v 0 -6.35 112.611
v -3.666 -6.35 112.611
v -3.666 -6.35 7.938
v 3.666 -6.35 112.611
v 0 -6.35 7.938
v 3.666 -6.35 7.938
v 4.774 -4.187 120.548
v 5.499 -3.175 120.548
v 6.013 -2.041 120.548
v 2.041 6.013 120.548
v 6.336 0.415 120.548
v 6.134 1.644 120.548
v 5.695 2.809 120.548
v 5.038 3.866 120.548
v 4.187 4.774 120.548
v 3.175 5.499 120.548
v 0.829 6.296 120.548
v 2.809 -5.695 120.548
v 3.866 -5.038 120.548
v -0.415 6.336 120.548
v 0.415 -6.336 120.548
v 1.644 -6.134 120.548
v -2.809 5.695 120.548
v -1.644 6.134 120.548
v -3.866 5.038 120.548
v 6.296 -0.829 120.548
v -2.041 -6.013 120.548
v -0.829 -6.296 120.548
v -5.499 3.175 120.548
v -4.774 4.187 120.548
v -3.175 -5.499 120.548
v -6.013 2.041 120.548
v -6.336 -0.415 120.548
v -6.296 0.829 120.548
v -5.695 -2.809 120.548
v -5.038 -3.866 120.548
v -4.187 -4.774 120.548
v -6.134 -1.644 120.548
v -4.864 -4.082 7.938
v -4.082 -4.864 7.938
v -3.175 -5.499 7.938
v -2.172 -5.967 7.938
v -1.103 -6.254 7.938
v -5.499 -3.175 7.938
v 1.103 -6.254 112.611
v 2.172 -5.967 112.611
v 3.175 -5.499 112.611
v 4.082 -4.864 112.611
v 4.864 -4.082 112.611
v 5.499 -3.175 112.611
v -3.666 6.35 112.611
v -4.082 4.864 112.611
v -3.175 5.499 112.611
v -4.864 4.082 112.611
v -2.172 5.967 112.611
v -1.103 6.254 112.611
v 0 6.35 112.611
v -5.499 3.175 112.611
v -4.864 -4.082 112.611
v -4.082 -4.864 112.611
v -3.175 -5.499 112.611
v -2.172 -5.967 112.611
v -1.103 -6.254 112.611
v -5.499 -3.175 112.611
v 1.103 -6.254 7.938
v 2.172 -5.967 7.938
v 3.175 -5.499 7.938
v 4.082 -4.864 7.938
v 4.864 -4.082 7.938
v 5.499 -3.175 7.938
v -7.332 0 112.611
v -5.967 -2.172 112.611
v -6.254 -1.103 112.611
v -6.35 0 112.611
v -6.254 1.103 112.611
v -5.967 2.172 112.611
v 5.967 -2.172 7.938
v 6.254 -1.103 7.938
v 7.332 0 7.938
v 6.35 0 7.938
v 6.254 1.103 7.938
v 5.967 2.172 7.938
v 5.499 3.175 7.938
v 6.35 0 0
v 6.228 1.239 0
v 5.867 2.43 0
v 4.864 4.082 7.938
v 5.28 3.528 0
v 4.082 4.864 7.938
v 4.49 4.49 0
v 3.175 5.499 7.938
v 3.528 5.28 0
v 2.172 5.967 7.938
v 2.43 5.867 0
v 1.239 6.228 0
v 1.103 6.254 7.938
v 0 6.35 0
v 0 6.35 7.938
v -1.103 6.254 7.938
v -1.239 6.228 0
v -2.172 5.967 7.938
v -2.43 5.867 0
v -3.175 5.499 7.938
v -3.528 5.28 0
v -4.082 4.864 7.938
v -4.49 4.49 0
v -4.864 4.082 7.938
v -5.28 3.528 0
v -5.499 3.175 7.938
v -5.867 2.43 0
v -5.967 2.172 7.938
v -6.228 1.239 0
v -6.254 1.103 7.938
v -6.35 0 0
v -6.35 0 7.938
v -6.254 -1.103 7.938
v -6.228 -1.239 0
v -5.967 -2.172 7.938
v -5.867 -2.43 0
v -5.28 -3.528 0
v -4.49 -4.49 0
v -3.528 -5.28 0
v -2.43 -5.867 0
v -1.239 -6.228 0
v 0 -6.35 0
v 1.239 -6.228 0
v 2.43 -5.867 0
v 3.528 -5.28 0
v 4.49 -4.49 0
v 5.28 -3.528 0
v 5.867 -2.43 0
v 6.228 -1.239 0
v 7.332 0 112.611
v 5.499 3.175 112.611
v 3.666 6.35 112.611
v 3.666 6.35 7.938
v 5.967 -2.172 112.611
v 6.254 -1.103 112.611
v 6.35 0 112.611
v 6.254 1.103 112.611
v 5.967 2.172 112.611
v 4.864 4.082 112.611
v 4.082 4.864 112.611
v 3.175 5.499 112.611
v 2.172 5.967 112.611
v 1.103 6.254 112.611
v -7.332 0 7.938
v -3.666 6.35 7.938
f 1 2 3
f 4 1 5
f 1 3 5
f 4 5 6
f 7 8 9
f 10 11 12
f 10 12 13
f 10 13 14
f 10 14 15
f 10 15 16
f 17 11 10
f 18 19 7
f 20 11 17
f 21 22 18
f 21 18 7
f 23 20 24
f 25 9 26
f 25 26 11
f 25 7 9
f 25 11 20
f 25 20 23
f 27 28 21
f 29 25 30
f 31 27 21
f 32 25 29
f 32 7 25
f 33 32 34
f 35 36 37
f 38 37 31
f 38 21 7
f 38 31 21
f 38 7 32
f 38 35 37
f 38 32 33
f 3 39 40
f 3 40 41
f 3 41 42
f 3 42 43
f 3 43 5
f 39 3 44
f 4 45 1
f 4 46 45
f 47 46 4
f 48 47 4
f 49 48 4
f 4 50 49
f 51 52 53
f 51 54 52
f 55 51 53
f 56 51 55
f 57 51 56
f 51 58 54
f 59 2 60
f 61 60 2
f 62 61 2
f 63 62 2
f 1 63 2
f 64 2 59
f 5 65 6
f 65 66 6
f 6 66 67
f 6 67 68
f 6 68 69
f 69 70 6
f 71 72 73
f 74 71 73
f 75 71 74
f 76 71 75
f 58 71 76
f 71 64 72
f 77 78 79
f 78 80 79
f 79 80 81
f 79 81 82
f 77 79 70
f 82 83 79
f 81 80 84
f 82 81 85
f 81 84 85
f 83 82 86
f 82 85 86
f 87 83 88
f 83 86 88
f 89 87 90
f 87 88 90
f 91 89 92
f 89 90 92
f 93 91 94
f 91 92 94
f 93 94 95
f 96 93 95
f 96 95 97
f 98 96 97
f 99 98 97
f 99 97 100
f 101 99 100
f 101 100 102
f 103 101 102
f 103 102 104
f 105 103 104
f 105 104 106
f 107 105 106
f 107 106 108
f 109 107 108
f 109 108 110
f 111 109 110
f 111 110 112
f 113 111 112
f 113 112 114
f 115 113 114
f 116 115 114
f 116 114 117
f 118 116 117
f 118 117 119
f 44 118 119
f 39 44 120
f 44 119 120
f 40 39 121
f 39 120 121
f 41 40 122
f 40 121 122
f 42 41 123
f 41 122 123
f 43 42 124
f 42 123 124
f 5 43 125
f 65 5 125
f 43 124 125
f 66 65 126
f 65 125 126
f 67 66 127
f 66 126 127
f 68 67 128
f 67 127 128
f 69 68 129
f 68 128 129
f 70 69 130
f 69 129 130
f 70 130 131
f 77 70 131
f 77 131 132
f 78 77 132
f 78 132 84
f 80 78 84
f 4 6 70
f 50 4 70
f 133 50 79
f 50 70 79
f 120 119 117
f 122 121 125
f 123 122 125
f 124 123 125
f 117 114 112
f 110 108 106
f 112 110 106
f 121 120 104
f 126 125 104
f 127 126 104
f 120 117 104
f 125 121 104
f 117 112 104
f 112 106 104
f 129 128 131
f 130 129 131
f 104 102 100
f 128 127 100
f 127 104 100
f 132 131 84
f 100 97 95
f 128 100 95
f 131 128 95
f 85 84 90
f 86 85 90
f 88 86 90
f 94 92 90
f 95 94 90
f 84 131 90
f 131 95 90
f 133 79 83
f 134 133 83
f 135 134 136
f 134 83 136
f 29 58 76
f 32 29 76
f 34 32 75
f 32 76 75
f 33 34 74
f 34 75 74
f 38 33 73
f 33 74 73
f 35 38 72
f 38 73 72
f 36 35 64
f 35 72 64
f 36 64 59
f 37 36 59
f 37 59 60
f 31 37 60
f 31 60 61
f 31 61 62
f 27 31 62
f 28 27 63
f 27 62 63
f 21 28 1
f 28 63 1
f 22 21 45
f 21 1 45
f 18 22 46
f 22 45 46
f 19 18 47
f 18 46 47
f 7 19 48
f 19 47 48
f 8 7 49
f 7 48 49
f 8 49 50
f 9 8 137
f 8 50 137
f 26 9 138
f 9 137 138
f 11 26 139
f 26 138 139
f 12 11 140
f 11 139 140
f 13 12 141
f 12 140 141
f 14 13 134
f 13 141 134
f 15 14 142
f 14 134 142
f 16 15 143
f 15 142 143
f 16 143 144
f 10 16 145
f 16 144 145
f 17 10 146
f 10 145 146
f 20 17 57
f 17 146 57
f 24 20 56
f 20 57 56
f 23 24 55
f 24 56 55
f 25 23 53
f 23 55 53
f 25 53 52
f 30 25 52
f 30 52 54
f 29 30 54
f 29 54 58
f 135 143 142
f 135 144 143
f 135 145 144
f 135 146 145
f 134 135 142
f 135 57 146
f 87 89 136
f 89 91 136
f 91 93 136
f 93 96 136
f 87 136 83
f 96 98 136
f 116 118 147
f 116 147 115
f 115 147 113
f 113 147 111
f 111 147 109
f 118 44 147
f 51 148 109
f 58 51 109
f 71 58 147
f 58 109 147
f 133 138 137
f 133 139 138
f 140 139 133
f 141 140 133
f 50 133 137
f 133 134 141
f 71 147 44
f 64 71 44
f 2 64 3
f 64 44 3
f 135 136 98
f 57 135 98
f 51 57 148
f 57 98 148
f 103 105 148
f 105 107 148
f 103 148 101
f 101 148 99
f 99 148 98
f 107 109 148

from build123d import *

# Parameters (mm, degrees)
SKETCH1_R           = 6.35
BOSS_EXTRUDE1_DEPTH = 7.9375
BOSS_EXTRUDE2_DEPTH = 104.6734
SKETCH3_R           = 6.35
BOSS_EXTRUDE3_DEPTH = 7.9375


with BuildPart() as part:
    # Sketch1 → Boss-Extrude1 (new body)
    with BuildSketch(Plane.XY):
        Circle(SKETCH1_R)
    extrude(amount=BOSS_EXTRUDE1_DEPTH)

    # Sketch2 → Boss-Extrude2 (add)
    with BuildSketch(Plane.XY.offset(7.9375)):
        Polygon((7.332348419, 0), (3.666174209, 6.35), (-3.666174209, 6.35), (-7.332348419, 0), (-3.666174209, -6.35), (3.666174209, -6.35), align=None)
    extrude(amount=BOSS_EXTRUDE2_DEPTH)

    # Sketch3 → Boss-Extrude3 (add)
    with BuildSketch(Plane.XY.offset(112.6109)):
        with Locations(Location((0, 0, 0), (0, 0, 150))):
            Circle(SKETCH3_R)
    extrude(amount=BOSS_EXTRUDE3_DEPTH)


solid = part.part
